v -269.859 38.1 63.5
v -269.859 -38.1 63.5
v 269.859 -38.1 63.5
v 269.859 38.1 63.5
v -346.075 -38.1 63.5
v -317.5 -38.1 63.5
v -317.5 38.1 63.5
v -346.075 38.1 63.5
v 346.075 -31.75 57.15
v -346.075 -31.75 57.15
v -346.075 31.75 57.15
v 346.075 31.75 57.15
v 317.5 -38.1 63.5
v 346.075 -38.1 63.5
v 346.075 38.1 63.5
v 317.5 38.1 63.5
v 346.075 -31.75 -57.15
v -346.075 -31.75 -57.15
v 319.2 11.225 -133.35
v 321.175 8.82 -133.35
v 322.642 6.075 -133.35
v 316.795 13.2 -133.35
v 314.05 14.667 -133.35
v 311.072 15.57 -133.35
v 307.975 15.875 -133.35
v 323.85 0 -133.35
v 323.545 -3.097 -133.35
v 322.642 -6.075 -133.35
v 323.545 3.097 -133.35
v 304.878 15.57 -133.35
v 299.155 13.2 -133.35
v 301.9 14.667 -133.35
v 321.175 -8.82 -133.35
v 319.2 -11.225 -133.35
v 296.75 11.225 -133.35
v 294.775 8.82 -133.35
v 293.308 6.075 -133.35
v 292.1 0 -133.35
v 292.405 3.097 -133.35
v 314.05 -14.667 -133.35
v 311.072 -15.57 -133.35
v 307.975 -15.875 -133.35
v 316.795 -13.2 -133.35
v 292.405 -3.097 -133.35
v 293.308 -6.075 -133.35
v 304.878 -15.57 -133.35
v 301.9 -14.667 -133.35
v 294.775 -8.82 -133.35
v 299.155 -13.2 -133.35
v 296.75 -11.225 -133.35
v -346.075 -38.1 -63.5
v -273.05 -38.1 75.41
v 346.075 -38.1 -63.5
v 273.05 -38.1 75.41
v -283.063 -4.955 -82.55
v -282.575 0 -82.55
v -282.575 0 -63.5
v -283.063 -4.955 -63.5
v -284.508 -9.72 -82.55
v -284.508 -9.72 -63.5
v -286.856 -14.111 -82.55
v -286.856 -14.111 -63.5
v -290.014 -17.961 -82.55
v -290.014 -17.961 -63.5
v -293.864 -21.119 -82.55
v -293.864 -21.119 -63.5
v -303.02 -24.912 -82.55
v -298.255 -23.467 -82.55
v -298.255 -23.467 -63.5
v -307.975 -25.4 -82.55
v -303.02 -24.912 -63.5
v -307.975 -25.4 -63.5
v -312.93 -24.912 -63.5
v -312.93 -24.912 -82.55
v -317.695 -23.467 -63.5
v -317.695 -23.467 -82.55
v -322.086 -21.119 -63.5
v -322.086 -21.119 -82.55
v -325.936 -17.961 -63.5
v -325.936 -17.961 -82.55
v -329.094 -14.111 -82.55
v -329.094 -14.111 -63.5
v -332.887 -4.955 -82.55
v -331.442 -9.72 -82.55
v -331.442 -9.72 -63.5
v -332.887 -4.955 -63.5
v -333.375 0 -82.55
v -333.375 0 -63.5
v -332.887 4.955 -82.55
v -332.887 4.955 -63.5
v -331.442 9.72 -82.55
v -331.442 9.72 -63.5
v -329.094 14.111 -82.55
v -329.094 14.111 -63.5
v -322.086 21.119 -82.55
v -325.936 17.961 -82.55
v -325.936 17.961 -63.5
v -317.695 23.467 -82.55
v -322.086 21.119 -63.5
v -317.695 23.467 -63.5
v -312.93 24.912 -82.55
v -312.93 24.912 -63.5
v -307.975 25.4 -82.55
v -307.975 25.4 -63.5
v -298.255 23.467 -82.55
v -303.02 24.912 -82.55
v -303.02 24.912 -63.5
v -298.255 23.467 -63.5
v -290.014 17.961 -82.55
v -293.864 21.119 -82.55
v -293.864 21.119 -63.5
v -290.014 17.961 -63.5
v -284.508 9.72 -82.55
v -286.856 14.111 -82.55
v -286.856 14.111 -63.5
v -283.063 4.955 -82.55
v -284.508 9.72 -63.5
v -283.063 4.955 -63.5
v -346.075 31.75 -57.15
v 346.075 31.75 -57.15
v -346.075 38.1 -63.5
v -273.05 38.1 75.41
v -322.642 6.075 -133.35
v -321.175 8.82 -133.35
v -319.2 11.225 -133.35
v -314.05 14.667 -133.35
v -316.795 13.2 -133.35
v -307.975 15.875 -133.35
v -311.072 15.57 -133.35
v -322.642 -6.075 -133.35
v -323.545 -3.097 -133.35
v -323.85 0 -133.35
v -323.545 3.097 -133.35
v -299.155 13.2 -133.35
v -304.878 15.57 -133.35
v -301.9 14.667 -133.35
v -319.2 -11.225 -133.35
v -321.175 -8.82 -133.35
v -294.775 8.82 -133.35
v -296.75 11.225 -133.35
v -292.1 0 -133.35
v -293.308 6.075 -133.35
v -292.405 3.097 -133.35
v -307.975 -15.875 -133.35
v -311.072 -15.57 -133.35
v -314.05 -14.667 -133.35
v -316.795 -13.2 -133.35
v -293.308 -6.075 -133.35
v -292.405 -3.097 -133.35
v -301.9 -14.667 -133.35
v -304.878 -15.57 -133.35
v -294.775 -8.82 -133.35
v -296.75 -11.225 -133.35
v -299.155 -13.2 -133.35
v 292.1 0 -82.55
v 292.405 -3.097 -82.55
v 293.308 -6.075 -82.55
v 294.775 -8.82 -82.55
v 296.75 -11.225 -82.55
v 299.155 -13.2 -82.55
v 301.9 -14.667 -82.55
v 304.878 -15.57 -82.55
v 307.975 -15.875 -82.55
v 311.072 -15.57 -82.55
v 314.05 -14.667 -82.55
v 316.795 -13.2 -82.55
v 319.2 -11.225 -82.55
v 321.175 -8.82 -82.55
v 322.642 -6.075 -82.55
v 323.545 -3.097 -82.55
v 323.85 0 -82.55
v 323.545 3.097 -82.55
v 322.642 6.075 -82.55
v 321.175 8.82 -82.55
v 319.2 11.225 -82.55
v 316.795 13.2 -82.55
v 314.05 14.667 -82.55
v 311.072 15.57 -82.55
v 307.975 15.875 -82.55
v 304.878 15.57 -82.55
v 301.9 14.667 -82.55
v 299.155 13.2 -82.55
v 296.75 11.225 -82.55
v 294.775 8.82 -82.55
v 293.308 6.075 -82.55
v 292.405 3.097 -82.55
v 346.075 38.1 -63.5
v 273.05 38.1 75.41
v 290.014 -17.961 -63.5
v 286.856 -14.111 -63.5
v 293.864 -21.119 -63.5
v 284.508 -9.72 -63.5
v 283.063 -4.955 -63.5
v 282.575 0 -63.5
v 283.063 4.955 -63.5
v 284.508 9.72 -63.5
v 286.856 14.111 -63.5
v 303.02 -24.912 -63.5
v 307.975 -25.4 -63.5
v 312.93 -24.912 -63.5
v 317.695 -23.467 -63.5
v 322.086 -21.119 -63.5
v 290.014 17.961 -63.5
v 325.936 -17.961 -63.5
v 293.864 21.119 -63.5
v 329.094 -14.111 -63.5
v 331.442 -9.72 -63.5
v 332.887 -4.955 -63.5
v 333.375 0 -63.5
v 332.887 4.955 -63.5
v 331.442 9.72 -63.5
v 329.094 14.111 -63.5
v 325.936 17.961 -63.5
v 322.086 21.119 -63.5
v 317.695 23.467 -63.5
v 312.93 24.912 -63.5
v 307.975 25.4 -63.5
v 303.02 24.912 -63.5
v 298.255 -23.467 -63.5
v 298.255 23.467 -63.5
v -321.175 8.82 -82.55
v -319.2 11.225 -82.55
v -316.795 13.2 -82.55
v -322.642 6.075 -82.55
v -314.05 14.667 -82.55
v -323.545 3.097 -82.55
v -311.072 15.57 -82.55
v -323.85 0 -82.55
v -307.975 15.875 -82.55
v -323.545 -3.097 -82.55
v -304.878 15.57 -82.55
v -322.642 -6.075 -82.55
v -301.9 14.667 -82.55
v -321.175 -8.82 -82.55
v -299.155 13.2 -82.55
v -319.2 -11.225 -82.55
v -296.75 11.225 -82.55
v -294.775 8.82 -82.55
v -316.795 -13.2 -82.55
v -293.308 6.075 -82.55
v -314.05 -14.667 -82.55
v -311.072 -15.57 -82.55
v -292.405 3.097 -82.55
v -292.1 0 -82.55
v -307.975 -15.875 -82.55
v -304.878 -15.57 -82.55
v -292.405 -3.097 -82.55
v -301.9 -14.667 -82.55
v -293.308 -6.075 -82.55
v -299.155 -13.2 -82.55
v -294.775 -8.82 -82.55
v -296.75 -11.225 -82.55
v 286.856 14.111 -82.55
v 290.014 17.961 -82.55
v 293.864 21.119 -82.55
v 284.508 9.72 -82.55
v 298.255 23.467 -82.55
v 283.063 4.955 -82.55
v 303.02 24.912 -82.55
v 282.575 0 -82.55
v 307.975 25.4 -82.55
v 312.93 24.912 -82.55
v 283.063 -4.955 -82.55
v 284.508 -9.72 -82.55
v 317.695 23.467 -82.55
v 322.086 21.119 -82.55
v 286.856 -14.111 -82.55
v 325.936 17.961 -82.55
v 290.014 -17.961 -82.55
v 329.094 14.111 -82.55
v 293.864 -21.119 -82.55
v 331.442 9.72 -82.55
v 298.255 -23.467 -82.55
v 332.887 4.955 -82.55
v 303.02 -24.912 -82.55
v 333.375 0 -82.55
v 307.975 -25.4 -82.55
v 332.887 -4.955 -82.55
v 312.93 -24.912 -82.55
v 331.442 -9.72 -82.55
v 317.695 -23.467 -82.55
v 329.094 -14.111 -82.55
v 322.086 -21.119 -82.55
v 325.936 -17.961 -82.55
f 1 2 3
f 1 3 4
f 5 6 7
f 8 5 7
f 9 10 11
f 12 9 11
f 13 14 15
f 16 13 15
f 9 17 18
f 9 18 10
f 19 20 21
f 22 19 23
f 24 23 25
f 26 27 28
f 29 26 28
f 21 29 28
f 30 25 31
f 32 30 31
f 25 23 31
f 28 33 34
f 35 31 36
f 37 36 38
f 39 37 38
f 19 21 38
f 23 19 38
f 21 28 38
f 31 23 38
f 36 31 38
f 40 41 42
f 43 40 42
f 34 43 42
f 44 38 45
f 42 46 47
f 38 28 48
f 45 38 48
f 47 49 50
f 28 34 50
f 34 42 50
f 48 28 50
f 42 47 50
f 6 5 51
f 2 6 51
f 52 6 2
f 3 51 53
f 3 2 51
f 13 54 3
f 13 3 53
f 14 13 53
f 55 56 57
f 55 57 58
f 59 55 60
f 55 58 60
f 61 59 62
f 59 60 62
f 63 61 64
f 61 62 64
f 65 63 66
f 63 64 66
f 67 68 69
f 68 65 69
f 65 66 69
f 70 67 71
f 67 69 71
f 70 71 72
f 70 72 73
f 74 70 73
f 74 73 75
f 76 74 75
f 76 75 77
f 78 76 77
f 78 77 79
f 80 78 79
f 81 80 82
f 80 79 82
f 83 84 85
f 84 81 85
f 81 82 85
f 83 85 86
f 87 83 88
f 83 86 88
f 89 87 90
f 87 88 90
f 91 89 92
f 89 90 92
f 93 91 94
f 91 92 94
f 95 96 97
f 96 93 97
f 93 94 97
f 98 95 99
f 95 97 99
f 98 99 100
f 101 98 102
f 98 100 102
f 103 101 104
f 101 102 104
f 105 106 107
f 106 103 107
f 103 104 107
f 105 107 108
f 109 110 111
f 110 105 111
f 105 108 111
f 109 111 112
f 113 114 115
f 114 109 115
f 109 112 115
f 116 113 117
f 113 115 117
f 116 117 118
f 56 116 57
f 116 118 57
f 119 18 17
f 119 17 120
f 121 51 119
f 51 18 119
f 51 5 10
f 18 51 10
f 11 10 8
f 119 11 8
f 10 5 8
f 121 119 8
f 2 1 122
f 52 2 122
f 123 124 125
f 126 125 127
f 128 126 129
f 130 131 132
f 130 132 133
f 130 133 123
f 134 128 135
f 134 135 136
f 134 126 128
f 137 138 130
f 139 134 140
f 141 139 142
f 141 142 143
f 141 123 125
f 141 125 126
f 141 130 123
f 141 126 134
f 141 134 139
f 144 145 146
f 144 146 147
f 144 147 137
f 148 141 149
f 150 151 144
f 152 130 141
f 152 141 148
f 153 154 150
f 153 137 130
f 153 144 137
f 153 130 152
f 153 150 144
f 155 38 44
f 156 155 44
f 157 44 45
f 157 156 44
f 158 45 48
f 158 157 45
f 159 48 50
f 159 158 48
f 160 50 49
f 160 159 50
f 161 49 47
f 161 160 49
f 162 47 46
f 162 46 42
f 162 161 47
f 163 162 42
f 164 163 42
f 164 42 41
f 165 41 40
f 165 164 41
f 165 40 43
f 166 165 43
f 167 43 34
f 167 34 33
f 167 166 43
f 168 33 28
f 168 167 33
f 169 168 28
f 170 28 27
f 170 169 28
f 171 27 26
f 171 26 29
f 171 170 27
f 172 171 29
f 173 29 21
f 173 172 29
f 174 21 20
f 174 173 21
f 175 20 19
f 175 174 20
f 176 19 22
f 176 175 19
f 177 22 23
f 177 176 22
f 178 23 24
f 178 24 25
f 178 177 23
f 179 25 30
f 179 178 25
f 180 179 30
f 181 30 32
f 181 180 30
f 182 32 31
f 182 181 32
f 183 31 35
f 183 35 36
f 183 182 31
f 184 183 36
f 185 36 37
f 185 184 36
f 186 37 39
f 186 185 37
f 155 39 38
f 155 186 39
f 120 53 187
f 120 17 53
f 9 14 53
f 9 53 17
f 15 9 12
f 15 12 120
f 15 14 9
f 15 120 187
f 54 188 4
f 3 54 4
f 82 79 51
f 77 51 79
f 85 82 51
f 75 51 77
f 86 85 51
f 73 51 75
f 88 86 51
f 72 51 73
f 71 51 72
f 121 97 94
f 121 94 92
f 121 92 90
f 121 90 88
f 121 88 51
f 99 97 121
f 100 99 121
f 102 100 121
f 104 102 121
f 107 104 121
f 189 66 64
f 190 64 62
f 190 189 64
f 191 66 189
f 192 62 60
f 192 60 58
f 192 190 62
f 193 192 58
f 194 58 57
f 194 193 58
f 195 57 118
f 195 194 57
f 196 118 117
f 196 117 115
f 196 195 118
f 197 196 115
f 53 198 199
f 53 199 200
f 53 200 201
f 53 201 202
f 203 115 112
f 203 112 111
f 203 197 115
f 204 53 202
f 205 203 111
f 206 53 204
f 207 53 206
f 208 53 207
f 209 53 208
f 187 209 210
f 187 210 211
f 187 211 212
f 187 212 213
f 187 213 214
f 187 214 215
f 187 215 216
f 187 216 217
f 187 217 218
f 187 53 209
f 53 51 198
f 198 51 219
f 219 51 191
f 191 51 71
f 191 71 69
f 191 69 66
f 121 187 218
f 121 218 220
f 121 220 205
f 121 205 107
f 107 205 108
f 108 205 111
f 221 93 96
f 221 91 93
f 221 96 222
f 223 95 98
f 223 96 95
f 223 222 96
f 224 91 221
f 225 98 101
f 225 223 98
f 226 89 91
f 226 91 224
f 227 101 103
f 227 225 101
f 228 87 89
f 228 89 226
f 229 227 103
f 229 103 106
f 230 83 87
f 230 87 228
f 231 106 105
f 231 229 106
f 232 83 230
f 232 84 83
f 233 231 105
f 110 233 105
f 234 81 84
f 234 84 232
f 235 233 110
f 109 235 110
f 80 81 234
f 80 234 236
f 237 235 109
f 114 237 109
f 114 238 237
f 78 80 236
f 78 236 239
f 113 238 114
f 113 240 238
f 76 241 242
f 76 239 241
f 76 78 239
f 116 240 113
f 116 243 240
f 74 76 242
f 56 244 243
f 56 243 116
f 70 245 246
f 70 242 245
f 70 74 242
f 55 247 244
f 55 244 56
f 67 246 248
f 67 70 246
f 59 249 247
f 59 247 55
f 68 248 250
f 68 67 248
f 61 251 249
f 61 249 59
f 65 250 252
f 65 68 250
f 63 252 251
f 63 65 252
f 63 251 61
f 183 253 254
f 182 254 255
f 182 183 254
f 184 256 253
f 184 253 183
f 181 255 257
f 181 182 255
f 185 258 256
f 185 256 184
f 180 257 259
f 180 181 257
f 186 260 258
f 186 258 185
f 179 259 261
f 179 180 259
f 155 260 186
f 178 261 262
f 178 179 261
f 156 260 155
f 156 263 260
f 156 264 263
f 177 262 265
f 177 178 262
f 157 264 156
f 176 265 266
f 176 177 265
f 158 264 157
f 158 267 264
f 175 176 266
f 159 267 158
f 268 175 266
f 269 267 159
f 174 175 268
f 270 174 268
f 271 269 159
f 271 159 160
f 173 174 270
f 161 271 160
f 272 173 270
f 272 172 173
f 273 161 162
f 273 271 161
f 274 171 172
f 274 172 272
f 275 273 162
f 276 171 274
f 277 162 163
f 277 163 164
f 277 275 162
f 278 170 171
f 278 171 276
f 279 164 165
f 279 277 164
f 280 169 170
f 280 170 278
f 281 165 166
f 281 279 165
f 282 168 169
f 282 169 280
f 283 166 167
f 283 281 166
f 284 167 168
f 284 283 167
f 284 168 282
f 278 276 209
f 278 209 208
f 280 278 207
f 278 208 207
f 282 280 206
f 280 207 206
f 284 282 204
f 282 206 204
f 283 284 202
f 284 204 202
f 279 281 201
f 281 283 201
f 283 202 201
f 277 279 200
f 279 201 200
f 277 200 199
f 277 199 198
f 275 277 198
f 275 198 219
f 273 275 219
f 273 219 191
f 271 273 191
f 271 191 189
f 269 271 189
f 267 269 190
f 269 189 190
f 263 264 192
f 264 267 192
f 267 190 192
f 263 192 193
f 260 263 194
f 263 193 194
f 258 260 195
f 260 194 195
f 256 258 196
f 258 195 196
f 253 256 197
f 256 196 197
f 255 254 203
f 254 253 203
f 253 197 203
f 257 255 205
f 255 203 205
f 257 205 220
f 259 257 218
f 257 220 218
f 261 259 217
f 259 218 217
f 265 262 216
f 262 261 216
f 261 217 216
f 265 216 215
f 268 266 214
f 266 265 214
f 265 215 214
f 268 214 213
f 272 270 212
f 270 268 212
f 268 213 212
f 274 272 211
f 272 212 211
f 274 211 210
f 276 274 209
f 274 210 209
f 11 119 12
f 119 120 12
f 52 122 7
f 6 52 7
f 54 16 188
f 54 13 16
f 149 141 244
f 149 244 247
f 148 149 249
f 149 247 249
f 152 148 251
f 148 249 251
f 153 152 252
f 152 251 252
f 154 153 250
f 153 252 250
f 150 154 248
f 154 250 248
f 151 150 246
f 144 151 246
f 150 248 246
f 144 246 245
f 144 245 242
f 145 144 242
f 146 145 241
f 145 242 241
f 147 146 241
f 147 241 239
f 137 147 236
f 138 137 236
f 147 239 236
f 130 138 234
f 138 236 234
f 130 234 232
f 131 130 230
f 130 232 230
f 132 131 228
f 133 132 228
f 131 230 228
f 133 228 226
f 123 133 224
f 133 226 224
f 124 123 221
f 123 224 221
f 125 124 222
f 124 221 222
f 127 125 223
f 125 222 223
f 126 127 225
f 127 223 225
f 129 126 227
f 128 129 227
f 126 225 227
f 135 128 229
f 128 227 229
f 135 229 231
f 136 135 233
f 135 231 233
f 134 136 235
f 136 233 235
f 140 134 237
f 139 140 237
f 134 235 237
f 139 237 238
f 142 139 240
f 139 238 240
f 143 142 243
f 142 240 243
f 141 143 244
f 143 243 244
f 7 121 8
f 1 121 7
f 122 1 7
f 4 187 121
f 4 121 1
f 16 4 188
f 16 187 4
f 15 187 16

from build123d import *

# Parameters (mm, degrees)
F0_W          = 76.2
F0_H          = 127
F0_W_2        = 63.5000020266
F0_H_2        = 114.3000020266
F1_DEPTH      = 346.075
F2_R          = 25.4
F3_DEPTH      = 19.05
F5_DEPTH      = 38.1
F5_DEPTH_BACK = 38.1
F6_R          = 15.875
F7_DEPTH      = 50.8


with BuildPart() as f1:
    # F0 (on Right) → F1 (new body, symmetric)
    with BuildSketch(Plane.YZ):
        Rectangle(F0_W, F0_H)
        Rectangle(F0_W_2, F0_H_2, mode=Mode.SUBTRACT)
    extrude(amount=F1_DEPTH, both=True)

    # F2 (on face) → F3 (join)
    with BuildSketch(Plane(origin=(0, 0, -63.5), x_dir=(1, 0, 0), z_dir=(0, 0, -1))):
        with Locations((-307.975, 0)):
            Circle(F2_R)
        with Locations((307.975, 0)):
            Circle(F2_R)
    extrude(amount=F3_DEPTH)

    # F4 (on Front) → F5 (join, two sides)
    with BuildSketch(Plane.XZ) as f5_sk:
        Polygon((-273.05, 75.4103416036), (-317.5, 63.5), (-273.05, 63.5), (-269.8586335857, 63.5), align=None)
        Polygon((269.8586335857, 63.5), (273.05, 63.5), (317.5, 63.5), (273.05, 75.4103416036), align=None)
    extrude(amount=-F5_DEPTH)
    extrude(f5_sk.sketch, amount=F5_DEPTH_BACK)

    # F6 (on face) → F7 (join)
    with BuildSketch(Plane(origin=(0, 0, -82.55), x_dir=(1, 0, 0), z_dir=(0, 0, -1))):
        with Locations((-307.975, 0)):
            Circle(F6_R)
    extrude(amount=F7_DEPTH)

    # F8: F1 across plane


with BuildPart() as f1_1:
    add(f1.part)
    add(f1.part.mirror(Plane.YZ))


solid = f1_1.part
